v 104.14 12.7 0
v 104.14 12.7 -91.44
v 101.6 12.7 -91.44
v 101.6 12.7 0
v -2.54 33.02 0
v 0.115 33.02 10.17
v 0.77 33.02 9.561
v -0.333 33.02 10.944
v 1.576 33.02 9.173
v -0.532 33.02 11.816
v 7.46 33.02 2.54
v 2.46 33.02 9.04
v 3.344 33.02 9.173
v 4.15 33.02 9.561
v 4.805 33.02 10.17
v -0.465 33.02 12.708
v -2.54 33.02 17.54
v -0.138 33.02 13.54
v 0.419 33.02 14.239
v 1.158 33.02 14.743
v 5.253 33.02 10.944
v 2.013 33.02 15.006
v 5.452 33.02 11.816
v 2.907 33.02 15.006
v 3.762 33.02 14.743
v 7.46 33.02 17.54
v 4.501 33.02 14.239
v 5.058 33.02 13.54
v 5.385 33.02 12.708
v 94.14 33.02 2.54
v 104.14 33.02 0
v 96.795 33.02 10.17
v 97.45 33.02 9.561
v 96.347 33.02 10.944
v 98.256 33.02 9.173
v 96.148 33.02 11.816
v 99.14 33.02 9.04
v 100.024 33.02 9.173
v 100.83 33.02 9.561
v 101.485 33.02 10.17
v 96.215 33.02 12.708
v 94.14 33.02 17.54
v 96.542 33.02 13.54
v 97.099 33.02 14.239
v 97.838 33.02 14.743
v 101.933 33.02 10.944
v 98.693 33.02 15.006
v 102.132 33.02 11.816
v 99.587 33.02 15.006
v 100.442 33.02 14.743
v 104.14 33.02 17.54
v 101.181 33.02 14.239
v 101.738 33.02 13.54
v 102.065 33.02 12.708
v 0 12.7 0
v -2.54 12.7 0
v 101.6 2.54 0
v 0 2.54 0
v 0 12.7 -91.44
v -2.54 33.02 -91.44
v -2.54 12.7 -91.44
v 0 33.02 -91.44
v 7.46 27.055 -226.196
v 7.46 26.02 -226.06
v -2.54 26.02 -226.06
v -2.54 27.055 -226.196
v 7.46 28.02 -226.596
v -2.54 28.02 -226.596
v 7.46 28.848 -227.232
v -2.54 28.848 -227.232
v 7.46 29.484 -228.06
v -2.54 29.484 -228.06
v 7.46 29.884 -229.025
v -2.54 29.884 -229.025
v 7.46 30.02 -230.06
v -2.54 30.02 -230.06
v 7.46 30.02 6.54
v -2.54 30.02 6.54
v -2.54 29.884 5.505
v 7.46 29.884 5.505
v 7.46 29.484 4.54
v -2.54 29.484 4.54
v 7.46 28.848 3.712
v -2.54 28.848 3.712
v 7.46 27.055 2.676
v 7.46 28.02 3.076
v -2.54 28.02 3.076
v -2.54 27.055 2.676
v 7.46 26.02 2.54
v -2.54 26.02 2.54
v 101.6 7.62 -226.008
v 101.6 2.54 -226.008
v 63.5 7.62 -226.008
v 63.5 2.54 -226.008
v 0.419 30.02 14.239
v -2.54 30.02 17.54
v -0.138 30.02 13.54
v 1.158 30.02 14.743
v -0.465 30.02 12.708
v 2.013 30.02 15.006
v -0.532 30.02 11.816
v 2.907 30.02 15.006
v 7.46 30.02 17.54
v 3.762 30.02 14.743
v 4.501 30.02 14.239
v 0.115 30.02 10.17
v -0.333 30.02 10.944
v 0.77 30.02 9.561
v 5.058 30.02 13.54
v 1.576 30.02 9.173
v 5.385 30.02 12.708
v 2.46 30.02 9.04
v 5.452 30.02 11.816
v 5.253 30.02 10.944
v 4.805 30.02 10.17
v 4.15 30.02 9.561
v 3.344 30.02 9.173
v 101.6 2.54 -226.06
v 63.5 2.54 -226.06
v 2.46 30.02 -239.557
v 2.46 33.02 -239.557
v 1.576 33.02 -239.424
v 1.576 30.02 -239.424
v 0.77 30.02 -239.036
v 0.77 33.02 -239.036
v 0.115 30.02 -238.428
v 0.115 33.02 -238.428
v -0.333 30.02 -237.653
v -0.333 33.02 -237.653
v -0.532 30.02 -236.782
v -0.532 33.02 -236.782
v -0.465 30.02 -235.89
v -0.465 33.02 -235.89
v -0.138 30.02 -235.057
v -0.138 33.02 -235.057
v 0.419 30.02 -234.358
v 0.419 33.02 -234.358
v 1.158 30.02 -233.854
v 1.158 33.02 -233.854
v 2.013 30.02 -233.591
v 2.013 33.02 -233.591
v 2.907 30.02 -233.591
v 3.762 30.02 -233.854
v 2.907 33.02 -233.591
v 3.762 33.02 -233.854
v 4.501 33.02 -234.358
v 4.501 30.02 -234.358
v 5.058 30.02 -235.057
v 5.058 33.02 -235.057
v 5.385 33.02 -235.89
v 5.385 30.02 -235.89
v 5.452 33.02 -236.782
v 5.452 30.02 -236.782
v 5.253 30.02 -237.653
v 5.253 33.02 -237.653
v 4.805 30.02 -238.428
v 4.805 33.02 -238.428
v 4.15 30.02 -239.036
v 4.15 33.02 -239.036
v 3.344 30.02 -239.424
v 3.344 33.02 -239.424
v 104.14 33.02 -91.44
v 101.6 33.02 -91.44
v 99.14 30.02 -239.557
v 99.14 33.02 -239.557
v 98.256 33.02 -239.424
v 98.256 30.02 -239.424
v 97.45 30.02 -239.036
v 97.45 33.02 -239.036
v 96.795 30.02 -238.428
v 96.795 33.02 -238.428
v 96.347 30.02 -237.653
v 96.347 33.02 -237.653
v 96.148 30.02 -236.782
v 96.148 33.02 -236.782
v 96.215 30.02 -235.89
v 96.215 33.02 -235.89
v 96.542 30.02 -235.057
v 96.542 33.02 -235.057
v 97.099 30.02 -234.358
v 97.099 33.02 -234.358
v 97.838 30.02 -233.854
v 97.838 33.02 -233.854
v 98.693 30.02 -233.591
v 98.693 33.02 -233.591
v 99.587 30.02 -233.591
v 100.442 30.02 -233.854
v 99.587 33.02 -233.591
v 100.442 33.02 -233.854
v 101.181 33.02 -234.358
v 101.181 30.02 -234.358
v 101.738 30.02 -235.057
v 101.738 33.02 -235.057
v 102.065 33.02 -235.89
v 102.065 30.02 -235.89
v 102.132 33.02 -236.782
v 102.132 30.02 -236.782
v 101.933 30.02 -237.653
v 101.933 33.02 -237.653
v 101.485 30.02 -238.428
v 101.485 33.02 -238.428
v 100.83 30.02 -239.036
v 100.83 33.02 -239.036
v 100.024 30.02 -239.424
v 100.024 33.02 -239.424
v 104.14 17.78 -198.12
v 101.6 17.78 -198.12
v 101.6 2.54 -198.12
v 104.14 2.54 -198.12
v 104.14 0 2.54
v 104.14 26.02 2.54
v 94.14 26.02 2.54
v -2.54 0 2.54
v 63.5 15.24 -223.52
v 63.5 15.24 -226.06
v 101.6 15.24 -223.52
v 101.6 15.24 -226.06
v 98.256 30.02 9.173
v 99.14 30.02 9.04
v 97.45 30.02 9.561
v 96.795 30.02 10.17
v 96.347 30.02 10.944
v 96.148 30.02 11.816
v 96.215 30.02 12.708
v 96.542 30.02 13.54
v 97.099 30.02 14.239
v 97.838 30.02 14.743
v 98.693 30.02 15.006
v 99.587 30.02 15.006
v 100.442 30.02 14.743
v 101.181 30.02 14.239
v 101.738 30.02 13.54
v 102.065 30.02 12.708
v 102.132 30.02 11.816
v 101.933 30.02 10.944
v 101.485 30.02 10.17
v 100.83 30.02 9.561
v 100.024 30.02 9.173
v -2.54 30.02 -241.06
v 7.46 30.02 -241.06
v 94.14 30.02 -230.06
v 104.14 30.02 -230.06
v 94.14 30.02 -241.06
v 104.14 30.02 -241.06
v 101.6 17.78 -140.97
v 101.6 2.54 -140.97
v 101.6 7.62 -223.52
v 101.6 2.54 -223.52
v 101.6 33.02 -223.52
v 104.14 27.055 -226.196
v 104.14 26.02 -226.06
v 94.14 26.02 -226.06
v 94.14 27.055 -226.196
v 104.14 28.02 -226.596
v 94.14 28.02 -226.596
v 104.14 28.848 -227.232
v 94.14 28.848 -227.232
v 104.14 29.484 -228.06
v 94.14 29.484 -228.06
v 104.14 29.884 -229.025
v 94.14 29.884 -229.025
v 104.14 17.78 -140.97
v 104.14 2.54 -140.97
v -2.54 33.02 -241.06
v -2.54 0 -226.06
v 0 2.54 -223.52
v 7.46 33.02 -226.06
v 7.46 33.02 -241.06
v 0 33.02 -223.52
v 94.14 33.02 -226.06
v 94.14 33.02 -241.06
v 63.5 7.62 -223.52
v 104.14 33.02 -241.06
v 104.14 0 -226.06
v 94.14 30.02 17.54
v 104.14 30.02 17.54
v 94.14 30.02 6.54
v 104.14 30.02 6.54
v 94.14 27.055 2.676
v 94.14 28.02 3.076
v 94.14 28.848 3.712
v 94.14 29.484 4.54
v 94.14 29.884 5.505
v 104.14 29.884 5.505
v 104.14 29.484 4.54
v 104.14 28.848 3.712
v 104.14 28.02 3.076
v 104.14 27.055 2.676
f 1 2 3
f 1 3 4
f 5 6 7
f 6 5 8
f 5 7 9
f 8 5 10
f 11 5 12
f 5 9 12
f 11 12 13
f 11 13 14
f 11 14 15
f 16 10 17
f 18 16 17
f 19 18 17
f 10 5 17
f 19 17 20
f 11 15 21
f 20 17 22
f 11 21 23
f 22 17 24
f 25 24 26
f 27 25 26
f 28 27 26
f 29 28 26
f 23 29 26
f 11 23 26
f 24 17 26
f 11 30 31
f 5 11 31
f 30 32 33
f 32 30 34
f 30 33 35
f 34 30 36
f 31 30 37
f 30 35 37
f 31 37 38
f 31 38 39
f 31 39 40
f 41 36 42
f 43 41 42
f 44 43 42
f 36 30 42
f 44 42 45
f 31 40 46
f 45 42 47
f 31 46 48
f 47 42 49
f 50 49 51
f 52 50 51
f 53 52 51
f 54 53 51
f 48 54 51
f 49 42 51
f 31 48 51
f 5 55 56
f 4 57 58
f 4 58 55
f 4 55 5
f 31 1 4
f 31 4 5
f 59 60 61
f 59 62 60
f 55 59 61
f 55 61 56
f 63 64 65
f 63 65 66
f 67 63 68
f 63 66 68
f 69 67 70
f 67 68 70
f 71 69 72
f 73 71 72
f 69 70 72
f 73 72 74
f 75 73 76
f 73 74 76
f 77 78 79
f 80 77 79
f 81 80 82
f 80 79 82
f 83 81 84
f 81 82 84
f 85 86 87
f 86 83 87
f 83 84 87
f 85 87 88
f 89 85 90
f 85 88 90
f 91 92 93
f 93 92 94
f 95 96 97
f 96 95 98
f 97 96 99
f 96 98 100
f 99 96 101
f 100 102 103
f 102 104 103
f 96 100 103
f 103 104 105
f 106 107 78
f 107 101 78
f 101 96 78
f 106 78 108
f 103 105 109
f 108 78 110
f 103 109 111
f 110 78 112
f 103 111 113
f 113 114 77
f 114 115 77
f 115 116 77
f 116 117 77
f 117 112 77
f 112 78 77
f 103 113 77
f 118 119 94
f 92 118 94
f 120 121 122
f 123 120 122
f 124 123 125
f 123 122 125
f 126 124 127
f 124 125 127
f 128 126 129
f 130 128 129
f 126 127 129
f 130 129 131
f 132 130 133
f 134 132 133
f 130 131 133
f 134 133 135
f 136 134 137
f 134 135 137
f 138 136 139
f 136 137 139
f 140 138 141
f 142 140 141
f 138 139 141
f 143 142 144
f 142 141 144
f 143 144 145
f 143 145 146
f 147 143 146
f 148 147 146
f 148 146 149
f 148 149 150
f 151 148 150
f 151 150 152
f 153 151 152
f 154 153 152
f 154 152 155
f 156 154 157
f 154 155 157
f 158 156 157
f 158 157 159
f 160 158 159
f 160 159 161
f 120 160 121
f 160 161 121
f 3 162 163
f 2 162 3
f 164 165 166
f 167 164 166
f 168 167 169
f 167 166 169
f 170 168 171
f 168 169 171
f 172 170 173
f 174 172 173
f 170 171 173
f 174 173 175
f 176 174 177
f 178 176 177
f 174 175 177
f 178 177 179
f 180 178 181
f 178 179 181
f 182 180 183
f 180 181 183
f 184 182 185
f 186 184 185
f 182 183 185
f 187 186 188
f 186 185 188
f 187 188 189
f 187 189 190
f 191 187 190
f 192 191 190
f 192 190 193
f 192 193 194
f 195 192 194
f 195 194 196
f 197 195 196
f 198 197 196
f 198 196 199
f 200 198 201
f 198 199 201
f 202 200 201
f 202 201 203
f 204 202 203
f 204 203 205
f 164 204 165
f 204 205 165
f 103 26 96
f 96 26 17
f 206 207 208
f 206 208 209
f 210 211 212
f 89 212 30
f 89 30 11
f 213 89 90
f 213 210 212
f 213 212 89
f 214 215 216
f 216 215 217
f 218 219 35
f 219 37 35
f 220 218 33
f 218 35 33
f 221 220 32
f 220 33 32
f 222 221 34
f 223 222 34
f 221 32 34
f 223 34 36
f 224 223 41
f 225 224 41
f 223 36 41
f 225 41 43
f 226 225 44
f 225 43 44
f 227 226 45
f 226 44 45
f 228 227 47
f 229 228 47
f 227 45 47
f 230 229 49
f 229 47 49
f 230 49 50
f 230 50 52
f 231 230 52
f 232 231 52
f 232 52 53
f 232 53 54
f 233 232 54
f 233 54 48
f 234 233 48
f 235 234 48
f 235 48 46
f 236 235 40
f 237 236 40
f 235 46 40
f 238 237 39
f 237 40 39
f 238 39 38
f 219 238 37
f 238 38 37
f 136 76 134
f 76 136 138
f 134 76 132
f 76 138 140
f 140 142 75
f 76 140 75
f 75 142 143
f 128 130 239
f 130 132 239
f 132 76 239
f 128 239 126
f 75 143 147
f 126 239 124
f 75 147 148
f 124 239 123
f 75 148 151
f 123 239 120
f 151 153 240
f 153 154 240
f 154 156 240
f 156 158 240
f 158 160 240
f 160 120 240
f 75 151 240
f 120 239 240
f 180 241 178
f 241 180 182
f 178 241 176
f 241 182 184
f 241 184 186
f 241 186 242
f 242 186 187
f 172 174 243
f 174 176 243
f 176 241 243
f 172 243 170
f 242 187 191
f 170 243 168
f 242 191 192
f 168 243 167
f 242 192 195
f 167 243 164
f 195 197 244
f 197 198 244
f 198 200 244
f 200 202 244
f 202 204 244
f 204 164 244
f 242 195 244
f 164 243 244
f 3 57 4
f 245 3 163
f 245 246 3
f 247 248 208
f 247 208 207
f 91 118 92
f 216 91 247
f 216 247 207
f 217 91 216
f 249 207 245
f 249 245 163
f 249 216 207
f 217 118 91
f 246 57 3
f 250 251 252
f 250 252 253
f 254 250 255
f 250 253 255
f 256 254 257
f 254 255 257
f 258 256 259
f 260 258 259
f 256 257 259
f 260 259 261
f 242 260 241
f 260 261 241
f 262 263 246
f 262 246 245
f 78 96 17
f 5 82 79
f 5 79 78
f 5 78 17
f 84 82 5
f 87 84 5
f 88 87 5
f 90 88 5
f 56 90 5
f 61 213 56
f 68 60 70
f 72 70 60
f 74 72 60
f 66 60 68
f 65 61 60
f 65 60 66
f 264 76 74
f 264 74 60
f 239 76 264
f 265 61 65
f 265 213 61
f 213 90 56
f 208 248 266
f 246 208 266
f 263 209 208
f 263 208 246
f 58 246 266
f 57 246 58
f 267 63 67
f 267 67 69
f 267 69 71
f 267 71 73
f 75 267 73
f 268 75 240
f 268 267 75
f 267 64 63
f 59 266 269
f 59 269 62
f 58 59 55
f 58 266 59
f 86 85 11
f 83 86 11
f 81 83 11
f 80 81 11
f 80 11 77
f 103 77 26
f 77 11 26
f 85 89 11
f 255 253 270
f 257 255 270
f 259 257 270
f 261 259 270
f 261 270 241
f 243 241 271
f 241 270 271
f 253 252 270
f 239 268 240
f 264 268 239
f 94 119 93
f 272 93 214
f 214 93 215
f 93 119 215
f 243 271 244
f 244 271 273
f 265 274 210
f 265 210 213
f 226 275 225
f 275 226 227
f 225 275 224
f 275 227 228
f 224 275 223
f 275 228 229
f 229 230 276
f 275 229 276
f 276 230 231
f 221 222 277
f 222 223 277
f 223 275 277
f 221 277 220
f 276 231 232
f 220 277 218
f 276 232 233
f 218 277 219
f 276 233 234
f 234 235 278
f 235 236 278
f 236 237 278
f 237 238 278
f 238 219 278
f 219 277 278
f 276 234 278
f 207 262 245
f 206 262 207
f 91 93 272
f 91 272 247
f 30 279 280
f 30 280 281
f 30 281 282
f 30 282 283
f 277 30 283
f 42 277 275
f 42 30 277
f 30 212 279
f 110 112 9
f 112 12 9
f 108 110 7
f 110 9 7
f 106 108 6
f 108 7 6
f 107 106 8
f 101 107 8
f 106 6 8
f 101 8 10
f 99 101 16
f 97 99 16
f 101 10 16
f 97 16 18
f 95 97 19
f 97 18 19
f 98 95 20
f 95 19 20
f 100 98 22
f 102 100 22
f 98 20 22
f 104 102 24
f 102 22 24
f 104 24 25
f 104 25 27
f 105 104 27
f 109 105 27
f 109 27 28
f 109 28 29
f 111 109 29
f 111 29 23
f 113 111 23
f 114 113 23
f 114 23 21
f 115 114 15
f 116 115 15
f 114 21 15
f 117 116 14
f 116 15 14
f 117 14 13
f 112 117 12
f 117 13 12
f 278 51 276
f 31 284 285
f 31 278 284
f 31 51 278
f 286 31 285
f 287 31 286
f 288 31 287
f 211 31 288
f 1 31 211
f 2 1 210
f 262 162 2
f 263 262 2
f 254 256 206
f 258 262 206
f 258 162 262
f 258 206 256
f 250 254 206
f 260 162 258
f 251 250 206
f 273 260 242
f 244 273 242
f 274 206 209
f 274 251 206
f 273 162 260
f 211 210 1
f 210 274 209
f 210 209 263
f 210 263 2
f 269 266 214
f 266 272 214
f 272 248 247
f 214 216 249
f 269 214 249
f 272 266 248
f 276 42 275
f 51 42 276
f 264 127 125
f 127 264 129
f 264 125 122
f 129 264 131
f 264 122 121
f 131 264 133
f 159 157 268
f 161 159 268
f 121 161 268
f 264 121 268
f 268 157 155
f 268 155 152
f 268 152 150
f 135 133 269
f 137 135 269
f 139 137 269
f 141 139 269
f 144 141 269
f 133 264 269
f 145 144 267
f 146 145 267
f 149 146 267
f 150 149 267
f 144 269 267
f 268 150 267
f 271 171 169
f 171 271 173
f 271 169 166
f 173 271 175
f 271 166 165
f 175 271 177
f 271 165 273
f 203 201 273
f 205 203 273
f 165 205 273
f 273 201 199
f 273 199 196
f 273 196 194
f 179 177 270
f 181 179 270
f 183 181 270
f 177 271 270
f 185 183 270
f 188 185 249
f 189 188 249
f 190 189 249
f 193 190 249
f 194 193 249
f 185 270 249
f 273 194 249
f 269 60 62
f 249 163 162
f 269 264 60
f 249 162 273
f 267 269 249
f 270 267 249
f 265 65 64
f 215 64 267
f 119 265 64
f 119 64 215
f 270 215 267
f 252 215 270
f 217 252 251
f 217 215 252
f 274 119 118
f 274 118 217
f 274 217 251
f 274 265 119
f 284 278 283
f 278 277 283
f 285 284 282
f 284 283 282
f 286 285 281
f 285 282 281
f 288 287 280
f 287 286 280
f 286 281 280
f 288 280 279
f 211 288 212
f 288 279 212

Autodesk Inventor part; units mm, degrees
ref_plane "YZ Plane" through (0, 0, 0) normal (1, 0, 0) x (0, 1, 0)
ref_plane "XZ Plane" through (0, 0, 0) normal (0, 1, 0) x (-1, 0, 0)
ref_plane "XY Plane" through (0, 0, 0) normal (0, 0, 1) x (1, 0, 0)
sketch "Sketch1" plane through (0, 0, 0) normal (0, 1, 0) x (-1, 0, 0)
  line L0 (0, 0) -> (-101.6, 0)
  line L1 (-101.6, 0) -> (-101.6, -223.52)
  line L2 (-101.6, -223.52) -> (0, -223.52)
  line L3 (0, -223.52) -> (0, 0)
  dimension "d0" = 101.6
  dimension "d1" = 223.52
extrude "Extrusion1" add sketch "Sketch1" along normal blind 2.54
sketch "Sketch2" plane through (0, 0, 0) normal (0, -1, 0) x (1, 0, 0)
  line L0 (104.14, 2.54) -> (-2.54, 2.54)
  line L1 (-2.54, 2.54) -> (-2.54, -226.06)
  line L2 (-2.54, -226.06) -> (104.14, -226.06)
  line L3 (104.14, -226.06) -> (104.14, 2.54)
  line L4 (101.6, 0) -> (101.6, -223.52) projected
  line L5 (0, -223.52) -> (0, 0) projected
  line L6 (101.6, -223.52) -> (0, -223.52) projected
  line L7 (0, 0) -> (101.6, 0) projected
  dimension "d4" = 2.54
  dimension "d5" = 2.54
  dimension "d6" = 2.54
  dimension "d7" = 2.54
extrude "Extrusion2" add sketch "Sketch2" against normal blind 33.02
sketch "Sketch3" plane through (104.14, 0, 2.54) normal (1, 0, 0) x (0, 0, -1)
  line L0 (2.54, 2.54) -> (2.54, 33.02) projected
  line L1 (2.54, 33.02) -> (93.98, 33.02)
  line L2 (93.98, 33.02) -> (93.98, 12.7)
  line L3 (93.98, 12.7) -> (2.54, 12.7)
  line L4 (2.54, 12.7) -> (2.54, 33.02)
  point P0 (2.54, 0)
  point P1 (2.54, 12.7)
  dimension "d10" = 91.44
  dimension "d11" = 20.32
extrude "Extrusion3" cut sketch "Sketch3" against normal up to surface (106.68 mm away)
sketch "Sketch4" plane through (104.14, 0, -226.06) normal (0, 0, -1) x (-1, 0, 0)
  line L0 (2.54, 2.54) -> (2.54, 12.7) projected
  line L1 (2.54, 2.54) -> (40.64, 2.54)
  line L2 (40.64, 2.54) -> (40.64, 15.24)
  line L3 (40.64, 15.24) -> (2.54, 15.24)
  line L4 (2.54, 15.24) -> (2.54, 2.54)
  point P0 (104.14, 0)
  point P1 (2.54, 7.62)
  dimension "d14" = 38.1
  dimension "d17" = 12.7
extrude "Extrusion4" cut sketch "Sketch4" against normal up to surface (2.54 mm away)
sketch "Sketch5" plane through (0, 33.02, 0) normal (0, 1, 0) x (1, 0, 0)
  line L0 (104.14, -2.54) -> (-2.54, -2.54) projected
  line L1 (50.8, -2.54) -> (50.8, -16.5675)
  line L2 (114.0141, 111.76) -> (126.7141, 111.76)
  line L3 (-2.54, -2.54) -> (7.46, -2.54)
  line L4 (7.46, -2.54) -> (7.46, -17.54)
  line L5 (7.46, -17.54) -> (-2.54, -17.54)
  line L6 (-2.54, -17.54) -> (-2.54, -2.54)
  line L7 (-2.54, -2.54) -> (104.14, -2.54)
  line L8 (104.14, -2.54) -> (94.14, -2.54)
  line L9 (94.14, -2.54) -> (94.14, -17.54)
  line L10 (94.14, -17.54) -> (104.14, -17.54)
  line L11 (104.14, -17.54) -> (104.14, -2.54)
  line L12 (104.14, 226.06) -> (-2.54, 226.06)
  line L13 (7.46, 226.06) -> (7.46, 241.06)
  line L14 (7.46, 241.06) -> (-2.54, 241.06)
  line L15 (-2.54, 241.06) -> (-2.54, 226.06)
  line L16 (94.14, 226.06) -> (94.14, 241.06)
  line L17 (104.14, 241.06) -> (104.14, 226.06)
  line L18 (94.14, 241.06) -> (104.14, 241.06)
  point P0 (0, 0)
  dimension "d21" = 10
  dimension "d22" = 15
extrude "Extrusion5" add sketch "Sketch5" against normal blind 3
fillet "Fillet1" radius 4 4 edges at (99.14, 30.02, 2.54) (2.46, 30.02, 2.54) (2.46, 30.02, -226.06) (99.14, 30.02, -226.06)
sketch "Sketch6" plane through (104.14, 0, 2.54) normal (1, 0, 0) x (0, 0, -1)
  point P0 (2.54, 0)
sketch "Sketch7" plane through (104.14, 0, 2.54) normal (1, 0, 0) x (0, 0, -1)
  line L0 (226.06, 2.54) -> (226.06, 15.24) projected
  line L1 (226.06, 2.54) -> (143.51, 2.54)
  line L2 (143.51, 2.54) -> (143.51, 17.78)
  line L3 (143.51, 17.78) -> (226.06, 17.78)
  line L4 (226.06, 17.78) -> (226.06, 2.54)
  point P0 (2.54, 0)
  dimension "d26" = 82.55
  dimension "d27" = 15.24
extrude "Extrusion6" cut sketch "Sketch7" against normal up to surface (2.54 mm away)
sketch "Sketch8" plane through (0, 33.02, -223.52) normal (0, 0, 1) x (1, 0, 0)
  line L0 (63.5, -30.48) -> (63.5, -17.78) projected
  line L1 (63.5, -17.78) -> (101.6, -17.78) projected
  line L2 (101.6, -30.48) -> (101.6, -17.78) projected
  line L3 (104.14, -30.48) -> (101.6, -30.48) projected
  line L4 (104.14, -15.24) -> (104.14, -30.48) projected
  line L5 (104.14, -15.24) -> (101.6, -15.24) projected
  line L6 (101.6, -15.24) -> (101.6, 0) projected
  line L7 (0, 0) -> (101.6, 0) projected
  line L8 (0, -30.48) -> (0, 0) projected
  line L9 (63.5, -30.48) -> (0, -30.48) projected
  line L10 (104.14, -30.48) -> (101.6, -30.48)
  line L11 (101.6, -30.48) -> (101.6, -15.24)
  line L12 (101.6, -15.24) -> (104.14, -15.24)
  line L13 (104.14, -15.24) -> (104.14, -30.48)
  point P0 (0, -33.02)
extrude "Extrusion7" add sketch "Sketch8" along normal blind 25.4 contours L11 L5 L4 L3 L2
sketch "Sketch9" plane through (0, 2.54, 0) normal (0, 1, 0) x (1, 0, 0)
  line L0 (63.5, 226.06) -> (63.5, 223.52) projected
  line L1 (101.6474, 226.008) -> (63.5, 226.008)
  line L2 (63.5, 226.008) -> (63.5, 223.52)
  line L3 (63.5, 223.52) -> (101.6474, 223.52)
  line L4 (101.6474, 223.52) -> (101.6474, 226.008)
  point P0 (0, 0)
extrude "Extrusion8" add sketch "Sketch9" along normal blind 5.08
sketch "Sketch10" plane through (0, 30.02, 0) normal (0, -1, 0) x (1, 0, 0)
  line L0 (-2.54, 17.54) -> (7.46, 17.54) projected
  line L1 (2.46, 17.54) -> (2.46, 6.54)
  line L2 (7.46, 6.54) -> (-2.54, 6.54) projected
  line L3 (7.46, 6.54) -> (7.46, 17.54) projected
  line L4 (7.46, 12.04) -> (-2.54, 12.04)
  line L5 (-2.54, 0) -> (-2.54, 17.54) projected
  point P0 (0, 0)
  point P1 (2.46, 12.04)
hole "Hole1" at (2.46, 30.02, 12.04) direction (0, 1, 0) diameter 6 depth 3
pattern_linear "Rectangular Pattern1" count 2 spacing 96.68 along (1, 0, 0) count 2 spacing 248.5974 along (0, 0, -1) of "Hole1"
equation "\"d2\" = wallThickness"
equation "\"d4\" = wallThickness"
equation "\"d5\" = wallThickness"
equation "\"d6\" = wallThickness"
equation "\"d7\" = wallThickness"
equation "\"wallThickness\" = 2.54"
properties part number "bms_mount"
